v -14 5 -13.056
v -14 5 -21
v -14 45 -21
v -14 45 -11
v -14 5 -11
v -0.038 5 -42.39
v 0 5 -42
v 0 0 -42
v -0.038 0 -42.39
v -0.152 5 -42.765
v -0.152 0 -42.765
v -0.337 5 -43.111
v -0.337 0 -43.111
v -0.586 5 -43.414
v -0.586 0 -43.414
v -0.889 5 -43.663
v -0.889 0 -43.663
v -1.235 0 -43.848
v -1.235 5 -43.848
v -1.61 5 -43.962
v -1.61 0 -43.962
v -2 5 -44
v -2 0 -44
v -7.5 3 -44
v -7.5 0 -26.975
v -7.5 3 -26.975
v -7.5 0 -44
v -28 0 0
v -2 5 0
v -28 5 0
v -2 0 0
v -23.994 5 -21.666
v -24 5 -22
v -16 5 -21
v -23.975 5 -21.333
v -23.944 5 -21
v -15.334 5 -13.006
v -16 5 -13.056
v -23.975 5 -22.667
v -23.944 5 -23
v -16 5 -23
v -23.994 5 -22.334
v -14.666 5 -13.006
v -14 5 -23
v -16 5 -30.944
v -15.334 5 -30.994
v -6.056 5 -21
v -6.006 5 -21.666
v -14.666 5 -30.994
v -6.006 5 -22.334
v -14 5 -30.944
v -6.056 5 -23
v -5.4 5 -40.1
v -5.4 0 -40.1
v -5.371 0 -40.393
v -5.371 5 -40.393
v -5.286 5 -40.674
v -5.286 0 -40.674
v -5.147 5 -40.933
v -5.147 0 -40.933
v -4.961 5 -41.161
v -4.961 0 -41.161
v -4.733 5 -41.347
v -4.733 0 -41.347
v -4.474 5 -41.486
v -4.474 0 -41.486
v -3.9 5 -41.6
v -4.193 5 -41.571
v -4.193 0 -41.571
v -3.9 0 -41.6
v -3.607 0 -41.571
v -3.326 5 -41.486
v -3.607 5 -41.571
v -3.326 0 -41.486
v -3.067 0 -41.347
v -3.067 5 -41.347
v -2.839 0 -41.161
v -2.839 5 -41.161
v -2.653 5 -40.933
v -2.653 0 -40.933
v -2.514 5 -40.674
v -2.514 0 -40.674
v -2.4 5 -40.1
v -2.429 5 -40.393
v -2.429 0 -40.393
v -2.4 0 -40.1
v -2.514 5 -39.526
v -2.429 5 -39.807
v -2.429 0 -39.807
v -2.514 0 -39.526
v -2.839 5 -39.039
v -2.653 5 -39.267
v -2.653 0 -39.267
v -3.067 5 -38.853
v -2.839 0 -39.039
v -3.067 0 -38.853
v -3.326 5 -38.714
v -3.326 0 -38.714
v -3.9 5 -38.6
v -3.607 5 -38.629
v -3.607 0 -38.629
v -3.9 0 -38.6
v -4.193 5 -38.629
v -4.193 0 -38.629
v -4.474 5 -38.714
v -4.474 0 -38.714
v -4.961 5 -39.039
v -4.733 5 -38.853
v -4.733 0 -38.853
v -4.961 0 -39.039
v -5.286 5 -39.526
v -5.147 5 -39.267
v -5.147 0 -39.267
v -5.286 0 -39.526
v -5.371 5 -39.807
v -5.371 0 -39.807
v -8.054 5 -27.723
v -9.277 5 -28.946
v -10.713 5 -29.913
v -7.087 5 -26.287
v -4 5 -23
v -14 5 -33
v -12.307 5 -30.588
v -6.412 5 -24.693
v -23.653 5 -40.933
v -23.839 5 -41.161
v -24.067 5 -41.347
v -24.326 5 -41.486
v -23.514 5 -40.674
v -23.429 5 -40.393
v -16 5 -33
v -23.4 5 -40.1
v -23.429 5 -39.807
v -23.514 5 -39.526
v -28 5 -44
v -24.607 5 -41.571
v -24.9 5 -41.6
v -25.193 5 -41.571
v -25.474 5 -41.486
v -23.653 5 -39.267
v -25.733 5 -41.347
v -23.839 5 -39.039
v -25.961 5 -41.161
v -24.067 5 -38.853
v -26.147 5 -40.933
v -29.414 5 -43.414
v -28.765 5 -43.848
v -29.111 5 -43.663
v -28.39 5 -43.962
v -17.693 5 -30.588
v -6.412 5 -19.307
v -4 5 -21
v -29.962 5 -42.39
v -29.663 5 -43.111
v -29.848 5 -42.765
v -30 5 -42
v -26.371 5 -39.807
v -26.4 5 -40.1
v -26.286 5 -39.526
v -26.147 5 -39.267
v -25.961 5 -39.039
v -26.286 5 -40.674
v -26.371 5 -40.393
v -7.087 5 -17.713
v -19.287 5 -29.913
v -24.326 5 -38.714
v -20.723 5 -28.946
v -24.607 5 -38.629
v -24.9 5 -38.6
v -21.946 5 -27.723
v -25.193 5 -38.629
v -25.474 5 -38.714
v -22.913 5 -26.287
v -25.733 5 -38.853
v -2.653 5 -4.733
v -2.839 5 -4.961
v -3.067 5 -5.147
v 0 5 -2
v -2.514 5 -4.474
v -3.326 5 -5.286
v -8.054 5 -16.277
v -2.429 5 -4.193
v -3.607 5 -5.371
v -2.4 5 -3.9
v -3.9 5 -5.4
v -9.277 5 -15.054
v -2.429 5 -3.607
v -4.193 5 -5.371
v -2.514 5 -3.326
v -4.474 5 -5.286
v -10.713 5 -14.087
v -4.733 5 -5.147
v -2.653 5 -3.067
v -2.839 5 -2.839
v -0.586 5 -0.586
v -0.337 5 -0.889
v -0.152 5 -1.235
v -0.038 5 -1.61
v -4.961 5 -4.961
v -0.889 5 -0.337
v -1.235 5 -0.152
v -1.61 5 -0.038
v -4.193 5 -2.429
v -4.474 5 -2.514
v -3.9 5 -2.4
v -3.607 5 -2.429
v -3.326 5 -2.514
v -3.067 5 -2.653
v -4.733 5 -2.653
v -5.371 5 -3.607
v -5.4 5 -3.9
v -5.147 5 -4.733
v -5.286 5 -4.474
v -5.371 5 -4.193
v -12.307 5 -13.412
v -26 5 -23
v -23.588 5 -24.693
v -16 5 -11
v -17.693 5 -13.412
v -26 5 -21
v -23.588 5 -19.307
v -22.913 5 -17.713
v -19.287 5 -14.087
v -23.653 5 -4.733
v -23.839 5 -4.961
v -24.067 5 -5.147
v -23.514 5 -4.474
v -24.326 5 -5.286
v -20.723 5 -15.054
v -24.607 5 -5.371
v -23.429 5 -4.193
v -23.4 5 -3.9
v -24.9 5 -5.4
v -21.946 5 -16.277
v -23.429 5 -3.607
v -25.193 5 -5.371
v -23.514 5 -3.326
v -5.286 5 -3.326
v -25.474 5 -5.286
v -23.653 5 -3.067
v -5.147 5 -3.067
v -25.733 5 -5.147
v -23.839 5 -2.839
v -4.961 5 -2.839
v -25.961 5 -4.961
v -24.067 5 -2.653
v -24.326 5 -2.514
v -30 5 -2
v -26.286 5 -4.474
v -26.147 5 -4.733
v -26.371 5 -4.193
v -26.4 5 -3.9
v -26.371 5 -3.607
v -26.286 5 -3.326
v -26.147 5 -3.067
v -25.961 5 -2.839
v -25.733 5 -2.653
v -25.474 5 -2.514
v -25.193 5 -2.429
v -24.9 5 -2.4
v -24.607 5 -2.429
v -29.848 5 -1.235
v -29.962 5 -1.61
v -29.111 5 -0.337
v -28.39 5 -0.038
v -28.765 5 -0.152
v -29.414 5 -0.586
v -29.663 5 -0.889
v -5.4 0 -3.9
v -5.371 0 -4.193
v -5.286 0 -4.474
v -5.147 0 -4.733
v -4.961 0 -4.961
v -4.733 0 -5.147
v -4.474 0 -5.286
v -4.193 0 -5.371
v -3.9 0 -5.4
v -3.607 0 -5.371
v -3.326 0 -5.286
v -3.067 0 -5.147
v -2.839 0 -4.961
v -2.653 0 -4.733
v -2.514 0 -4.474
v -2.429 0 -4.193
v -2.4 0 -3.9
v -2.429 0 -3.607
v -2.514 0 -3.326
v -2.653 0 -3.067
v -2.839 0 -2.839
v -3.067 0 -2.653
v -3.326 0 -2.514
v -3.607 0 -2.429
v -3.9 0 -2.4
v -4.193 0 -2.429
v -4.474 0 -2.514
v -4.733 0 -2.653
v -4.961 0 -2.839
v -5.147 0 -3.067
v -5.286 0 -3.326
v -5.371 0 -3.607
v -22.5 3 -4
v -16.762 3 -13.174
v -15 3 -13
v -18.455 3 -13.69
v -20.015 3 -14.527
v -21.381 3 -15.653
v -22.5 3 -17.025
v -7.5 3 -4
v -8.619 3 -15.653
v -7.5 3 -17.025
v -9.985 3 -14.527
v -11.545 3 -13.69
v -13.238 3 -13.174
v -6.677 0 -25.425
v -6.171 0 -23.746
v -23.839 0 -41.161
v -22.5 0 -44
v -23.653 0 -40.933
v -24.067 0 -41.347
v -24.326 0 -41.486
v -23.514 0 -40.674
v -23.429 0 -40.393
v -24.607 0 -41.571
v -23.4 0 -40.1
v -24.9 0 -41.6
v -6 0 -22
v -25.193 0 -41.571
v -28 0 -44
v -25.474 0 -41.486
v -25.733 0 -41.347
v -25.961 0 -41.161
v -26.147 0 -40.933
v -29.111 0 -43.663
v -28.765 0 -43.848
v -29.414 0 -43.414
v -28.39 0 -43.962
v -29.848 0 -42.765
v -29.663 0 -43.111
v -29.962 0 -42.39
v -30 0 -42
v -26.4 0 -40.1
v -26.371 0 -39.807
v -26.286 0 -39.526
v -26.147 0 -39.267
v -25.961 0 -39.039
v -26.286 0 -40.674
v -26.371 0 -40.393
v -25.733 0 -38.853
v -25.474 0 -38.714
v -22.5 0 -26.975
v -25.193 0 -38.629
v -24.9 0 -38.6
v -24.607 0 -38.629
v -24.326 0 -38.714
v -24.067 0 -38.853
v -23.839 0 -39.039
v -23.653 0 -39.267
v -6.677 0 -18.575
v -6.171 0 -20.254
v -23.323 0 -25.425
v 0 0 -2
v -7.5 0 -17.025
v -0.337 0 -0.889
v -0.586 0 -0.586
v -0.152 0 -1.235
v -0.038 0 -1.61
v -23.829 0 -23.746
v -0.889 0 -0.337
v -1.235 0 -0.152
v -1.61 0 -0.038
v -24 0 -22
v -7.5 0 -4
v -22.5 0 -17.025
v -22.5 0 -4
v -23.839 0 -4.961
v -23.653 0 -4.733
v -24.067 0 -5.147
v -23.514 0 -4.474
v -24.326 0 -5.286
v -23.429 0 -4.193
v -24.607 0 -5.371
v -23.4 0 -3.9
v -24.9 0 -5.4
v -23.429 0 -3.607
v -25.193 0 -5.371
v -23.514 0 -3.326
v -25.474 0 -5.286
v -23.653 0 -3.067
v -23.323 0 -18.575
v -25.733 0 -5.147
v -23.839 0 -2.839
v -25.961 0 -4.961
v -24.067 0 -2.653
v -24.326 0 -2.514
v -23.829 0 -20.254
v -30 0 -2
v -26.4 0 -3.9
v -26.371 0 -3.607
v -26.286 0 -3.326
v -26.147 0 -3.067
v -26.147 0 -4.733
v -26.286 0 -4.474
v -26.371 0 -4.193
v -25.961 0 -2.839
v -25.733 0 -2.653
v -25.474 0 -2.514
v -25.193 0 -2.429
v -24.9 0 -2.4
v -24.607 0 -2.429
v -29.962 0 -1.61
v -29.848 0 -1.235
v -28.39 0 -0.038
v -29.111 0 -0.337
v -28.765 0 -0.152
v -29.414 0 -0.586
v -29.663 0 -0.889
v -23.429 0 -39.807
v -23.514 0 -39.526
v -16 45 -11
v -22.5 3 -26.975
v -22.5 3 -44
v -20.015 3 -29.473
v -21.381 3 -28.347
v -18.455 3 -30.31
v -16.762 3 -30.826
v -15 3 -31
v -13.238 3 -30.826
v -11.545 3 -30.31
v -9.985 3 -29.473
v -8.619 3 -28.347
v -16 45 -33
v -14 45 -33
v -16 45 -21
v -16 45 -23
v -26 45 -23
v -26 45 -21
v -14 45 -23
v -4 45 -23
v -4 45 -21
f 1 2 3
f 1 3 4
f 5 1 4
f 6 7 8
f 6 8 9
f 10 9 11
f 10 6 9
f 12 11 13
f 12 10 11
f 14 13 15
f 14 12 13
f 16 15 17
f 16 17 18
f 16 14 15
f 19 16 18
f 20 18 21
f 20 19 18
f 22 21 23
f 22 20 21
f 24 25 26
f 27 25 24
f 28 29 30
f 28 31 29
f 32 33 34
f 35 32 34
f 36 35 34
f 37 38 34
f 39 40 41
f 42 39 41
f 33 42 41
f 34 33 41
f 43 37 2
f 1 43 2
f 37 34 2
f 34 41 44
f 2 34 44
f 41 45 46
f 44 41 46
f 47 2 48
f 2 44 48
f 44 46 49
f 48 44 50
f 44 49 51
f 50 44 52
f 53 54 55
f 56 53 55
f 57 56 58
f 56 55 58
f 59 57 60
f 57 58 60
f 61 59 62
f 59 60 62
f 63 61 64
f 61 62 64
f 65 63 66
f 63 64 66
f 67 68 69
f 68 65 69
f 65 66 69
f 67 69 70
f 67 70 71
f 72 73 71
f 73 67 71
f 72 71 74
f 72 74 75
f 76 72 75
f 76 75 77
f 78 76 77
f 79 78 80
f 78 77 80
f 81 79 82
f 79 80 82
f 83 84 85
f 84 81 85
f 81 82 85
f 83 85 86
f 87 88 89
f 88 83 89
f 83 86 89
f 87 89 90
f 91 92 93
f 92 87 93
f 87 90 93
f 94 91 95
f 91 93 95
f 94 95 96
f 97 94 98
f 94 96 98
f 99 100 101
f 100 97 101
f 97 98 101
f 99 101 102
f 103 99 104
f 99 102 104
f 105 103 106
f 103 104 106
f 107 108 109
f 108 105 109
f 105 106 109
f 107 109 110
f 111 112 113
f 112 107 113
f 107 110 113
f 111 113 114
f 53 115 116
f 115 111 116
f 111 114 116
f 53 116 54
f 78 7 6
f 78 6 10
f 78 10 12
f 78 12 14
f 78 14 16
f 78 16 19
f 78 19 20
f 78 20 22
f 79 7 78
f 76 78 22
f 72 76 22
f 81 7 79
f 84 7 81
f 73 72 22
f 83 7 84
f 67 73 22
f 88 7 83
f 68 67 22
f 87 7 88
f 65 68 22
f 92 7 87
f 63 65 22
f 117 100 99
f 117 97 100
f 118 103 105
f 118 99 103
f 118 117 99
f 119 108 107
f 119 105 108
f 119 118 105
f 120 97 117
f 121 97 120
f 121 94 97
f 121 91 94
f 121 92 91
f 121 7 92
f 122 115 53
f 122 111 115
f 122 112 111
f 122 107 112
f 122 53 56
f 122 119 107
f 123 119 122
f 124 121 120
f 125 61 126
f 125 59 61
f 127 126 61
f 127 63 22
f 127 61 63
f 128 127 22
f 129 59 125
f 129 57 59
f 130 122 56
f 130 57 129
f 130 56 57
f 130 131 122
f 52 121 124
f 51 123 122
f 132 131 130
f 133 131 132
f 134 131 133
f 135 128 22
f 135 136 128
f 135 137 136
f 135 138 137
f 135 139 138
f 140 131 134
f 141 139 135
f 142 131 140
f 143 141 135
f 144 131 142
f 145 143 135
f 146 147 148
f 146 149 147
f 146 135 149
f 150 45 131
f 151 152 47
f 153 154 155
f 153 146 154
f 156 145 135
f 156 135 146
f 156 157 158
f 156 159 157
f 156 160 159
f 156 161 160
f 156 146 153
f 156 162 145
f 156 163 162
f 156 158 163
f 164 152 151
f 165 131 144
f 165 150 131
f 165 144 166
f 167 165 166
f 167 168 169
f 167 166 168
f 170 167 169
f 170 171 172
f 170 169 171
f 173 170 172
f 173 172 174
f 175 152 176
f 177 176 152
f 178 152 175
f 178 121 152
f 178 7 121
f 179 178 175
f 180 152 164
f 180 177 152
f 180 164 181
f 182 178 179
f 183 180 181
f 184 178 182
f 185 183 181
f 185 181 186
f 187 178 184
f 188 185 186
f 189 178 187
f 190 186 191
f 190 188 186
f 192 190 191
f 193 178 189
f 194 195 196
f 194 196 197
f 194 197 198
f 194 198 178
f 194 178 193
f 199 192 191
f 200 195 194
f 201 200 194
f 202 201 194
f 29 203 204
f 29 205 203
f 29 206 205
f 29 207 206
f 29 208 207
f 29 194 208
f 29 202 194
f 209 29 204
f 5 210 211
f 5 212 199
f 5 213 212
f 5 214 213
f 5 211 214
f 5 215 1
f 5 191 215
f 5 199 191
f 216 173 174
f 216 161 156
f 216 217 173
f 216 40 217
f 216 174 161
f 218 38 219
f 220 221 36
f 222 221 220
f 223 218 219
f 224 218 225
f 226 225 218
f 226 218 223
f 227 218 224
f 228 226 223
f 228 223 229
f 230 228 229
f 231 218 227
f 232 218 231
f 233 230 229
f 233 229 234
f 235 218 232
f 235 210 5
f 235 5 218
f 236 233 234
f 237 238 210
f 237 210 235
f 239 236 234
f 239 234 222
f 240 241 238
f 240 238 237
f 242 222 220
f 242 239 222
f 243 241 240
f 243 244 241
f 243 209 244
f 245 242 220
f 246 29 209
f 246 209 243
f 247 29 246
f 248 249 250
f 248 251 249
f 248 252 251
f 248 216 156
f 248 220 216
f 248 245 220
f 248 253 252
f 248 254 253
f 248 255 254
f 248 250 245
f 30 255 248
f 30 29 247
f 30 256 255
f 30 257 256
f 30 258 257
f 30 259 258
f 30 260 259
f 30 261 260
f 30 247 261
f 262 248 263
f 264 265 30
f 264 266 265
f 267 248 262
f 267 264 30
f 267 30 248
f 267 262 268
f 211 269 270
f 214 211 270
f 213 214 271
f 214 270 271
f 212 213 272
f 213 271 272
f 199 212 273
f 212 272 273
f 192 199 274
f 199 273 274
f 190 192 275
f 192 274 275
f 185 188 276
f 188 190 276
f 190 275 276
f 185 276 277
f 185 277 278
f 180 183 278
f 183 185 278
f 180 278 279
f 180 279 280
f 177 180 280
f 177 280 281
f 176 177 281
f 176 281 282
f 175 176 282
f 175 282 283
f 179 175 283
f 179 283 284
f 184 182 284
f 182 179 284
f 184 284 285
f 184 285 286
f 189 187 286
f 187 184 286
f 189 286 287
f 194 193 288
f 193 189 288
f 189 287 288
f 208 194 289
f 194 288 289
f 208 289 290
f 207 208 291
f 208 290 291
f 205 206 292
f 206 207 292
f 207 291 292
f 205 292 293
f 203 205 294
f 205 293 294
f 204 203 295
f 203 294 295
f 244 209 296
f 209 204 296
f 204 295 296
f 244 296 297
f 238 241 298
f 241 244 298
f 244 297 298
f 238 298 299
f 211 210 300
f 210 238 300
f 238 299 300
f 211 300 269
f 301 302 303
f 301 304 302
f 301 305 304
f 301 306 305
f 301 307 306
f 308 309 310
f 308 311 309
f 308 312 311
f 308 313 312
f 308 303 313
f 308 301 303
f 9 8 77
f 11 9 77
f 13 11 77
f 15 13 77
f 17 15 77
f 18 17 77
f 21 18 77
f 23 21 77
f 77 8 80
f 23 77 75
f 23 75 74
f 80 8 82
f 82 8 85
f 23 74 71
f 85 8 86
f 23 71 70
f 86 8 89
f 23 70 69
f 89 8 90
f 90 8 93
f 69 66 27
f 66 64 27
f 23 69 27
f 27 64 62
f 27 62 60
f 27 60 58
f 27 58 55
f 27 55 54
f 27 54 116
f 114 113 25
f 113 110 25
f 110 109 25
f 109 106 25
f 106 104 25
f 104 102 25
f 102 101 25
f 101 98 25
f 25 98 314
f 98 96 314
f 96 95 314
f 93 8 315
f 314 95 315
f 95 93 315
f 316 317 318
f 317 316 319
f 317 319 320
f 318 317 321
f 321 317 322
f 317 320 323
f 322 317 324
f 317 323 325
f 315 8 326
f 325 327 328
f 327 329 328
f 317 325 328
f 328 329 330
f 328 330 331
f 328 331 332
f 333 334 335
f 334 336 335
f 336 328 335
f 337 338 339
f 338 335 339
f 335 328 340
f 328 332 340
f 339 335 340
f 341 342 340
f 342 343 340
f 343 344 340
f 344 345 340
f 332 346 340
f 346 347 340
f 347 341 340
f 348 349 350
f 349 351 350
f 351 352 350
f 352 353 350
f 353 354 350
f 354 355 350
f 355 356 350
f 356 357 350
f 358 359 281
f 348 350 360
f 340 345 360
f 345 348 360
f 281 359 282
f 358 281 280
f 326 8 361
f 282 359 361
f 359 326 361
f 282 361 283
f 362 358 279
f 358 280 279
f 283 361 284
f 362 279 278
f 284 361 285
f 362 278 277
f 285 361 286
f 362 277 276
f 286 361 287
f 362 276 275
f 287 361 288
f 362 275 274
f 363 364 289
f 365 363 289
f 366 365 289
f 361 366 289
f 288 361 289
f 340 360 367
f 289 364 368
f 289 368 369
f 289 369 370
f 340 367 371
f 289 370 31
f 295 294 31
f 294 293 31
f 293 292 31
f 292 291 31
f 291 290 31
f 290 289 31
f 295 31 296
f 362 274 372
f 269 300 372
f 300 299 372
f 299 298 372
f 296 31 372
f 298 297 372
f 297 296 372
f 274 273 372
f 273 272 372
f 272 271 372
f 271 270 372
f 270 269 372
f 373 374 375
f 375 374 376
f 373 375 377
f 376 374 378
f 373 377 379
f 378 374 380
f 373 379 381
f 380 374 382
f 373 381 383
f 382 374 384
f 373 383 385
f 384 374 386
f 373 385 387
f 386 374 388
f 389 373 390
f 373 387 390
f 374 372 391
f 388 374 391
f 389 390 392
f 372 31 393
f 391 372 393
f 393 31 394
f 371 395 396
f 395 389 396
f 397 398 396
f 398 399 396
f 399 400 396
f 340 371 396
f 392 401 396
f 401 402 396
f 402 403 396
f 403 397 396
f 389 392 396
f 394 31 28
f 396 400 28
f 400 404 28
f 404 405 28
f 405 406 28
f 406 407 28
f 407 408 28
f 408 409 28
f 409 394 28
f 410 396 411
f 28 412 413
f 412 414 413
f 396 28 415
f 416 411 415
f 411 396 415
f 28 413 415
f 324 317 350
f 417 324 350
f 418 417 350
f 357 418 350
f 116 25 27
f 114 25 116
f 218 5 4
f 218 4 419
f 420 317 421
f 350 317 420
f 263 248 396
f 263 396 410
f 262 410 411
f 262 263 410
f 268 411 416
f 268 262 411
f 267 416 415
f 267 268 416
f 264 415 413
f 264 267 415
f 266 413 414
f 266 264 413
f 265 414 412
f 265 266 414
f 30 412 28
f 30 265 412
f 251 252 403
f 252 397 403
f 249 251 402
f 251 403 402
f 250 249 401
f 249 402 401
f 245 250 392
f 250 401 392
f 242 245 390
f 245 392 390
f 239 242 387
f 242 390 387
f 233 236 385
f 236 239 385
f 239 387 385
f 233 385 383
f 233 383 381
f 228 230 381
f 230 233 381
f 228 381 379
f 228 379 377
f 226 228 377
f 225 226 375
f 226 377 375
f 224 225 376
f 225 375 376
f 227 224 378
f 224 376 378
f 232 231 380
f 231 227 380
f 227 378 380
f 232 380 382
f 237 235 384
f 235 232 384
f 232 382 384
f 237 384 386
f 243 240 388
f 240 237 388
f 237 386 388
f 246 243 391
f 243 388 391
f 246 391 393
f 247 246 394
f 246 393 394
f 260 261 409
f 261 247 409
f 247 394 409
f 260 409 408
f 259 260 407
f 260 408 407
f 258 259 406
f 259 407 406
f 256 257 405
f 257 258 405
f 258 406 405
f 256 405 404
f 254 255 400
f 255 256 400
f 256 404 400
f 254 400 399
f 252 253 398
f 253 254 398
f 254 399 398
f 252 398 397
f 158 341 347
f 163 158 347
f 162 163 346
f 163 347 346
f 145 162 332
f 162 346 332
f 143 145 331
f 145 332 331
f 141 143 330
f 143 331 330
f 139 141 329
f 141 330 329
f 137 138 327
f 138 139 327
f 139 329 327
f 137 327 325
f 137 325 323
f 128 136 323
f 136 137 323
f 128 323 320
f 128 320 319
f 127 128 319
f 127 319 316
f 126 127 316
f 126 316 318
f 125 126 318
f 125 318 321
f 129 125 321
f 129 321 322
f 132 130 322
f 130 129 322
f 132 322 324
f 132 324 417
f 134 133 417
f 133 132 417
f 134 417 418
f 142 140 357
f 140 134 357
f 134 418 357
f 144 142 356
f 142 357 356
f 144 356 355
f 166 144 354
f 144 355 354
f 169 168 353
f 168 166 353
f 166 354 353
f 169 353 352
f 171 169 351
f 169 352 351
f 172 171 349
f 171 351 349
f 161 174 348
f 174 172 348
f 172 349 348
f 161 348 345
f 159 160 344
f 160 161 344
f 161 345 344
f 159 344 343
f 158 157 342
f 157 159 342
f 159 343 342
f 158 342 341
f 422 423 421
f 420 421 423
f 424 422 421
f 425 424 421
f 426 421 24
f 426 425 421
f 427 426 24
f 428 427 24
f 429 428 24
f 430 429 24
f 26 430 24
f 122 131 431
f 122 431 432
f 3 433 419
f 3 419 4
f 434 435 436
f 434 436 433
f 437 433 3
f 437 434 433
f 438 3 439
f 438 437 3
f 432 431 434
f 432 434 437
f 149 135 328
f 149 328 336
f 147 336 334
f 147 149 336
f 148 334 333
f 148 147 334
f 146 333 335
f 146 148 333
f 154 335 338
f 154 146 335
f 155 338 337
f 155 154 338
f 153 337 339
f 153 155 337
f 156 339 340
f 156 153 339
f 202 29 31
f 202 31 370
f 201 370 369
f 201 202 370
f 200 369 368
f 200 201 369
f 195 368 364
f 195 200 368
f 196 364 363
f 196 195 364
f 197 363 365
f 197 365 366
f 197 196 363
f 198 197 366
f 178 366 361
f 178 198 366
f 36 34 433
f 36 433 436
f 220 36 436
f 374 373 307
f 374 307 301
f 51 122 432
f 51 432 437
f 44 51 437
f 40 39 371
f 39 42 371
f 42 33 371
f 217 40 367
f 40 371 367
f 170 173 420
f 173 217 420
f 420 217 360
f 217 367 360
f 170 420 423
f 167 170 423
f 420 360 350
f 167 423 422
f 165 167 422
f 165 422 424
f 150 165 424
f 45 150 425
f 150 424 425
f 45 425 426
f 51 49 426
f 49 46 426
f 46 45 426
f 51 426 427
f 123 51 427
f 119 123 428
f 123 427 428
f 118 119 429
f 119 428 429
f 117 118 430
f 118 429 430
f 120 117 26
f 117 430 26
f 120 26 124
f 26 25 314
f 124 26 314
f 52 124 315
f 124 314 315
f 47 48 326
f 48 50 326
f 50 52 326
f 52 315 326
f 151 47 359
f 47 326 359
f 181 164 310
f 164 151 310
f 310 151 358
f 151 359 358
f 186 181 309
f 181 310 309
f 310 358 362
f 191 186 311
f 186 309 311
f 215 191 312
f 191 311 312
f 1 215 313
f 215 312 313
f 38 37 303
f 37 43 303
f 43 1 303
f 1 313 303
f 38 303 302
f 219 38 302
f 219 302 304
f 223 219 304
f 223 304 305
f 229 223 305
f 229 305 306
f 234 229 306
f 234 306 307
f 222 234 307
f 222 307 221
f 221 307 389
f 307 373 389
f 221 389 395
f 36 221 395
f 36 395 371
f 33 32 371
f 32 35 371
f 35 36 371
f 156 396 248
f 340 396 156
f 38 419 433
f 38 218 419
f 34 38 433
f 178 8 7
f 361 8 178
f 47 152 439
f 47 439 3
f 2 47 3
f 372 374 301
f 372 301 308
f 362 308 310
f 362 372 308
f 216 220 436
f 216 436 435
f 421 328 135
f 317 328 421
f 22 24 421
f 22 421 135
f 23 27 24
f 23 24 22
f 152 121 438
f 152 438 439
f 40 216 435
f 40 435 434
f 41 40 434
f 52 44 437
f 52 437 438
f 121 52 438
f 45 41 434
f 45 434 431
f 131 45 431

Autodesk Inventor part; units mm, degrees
ref_plane "YZ Plane" through (0, 0, 0) normal (1, 0, 0) x (0, 1, 0)
ref_plane "XZ Plane" through (0, 0, 0) normal (0, 1, 0) x (-1, 0, 0)
ref_plane "XY Plane" through (0, 0, 0) normal (0, 0, 1) x (1, 0, 0)
sketch "Sketch1" plane through (0, 0, 0) normal (0, 1, 0) x (-1, 0, 0)
  line L0 (0, 0) -> (30, 0)
  line L1 (30, 0) -> (30, -44)
  line L2 (30, -44) -> (0, -44)
  line L3 (0, -44) -> (0, 0)
  circle A0 centre (24.9, -3.9) radius 1.5
  circle A1 centre (3.9, -3.9) radius 1.5
  circle A2 centre (3.9, -40.1) radius 1.5
  circle A3 centre (24.9, -40.1) radius 1.5
  circle A4 centre (15, -22) radius 9
  dimension "d0" = 44
  dimension "d1" = 30
  dimension "d2" = 3
  dimension "d3" = 3
  dimension "d4" = 3
  dimension "d5" = 3
  dimension "d8" = 3.9
  dimension "d9" = 3.9
  dimension "d10" = 3.9
  dimension "d11" = 3.9
  dimension "d12" = 3.9
  dimension "d14" = 21
  dimension "d15" = 3.9
  dimension "d17" = 21
  dimension "d18" = 18
  dimension "d19" = 22
  dimension "d20" = 15
extrude "Extrusion1" add sketch "Sketch1" along normal blind 5
sketch "Sketch2" plane through (0, 0, 0) normal (0, -1, 0) x (1, 0, 0)
  line L0 (-7.5, -44) -> (-22.5, -44)
  line L1 (-22.5, -44) -> (-22.5, -4)
  line L2 (-22.5, -4) -> (-7.5, -4)
  line L3 (-7.5, -4) -> (-7.5, -44)
  line L4 (0, 0) -> (-30, 0) projected
  line L5 (-30, -44) -> (0, -44) projected
  line L6 (0, -44) -> (0, 0) projected
  line L7 (-30, 0) -> (-30, -44) projected
  dimension "d24" = 4
  dimension "d25" = 0
  dimension "d26" = 15
  dimension "d27" = 7.5
  dimension "d28" = 7.5
extrude "Extrusion2" cut sketch "Sketch2" against normal blind 3 contours L0 L1 L2 L3
fillet "Fillet1" radius 2 4 edges at (0, 2.5, 0) (-30, 2.5, 0) (-30, 2.5, -44) (0, 2.5, -44)
sketch "Sketch3" plane through (0, 5, 0) normal (0, 1, 0) x (1, 0, 0)
  line L0 (-26, 23) -> (-4, 23)
  line L1 (-4, 23) -> (-4, 21)
  line L2 (-4, 21) -> (-26, 21)
  line L3 (-26, 21) -> (-26, 23)
  line L4 (-2, 44) -> (-28, 44) projected
  circle A0 centre (-15, 22) radius 9 projected
  line L5 (-16, 33) -> (-14, 33)
  line L6 (-14, 33) -> (-14, 11)
  line L7 (-14, 11) -> (-16, 11)
  line L8 (-16, 11) -> (-16, 33)
  line L9 (-30, 42) -> (-30, 2) projected
  point P0 (0, 0)
  dimension "d32" = 2
  dimension "d33" = 21
  dimension "d34" = 11
  dimension "d35" = 11
  dimension "d36" = 14
  dimension "d37" = 2
  dimension "d38" = 11
  dimension "d39" = 11
extrude "Extrusion3" add sketch "Sketch3" along normal blind 40 contours L0 A0 L2 L3 | L0 L8 L2 A0 | L8 A0 L6 L0 | L0 L6 L2 L8 | L8 L5 L6 A0 | L0 A0 L2 L6 | L2 L6 A0 L8 | A0 L6 L7 L8 | L0 L1 L2 A0
sketch "Sketch4" plane through (-14, 5, -13.0557) normal (1, 0, 0) x (0, 0, -1)
  point P0 (-13.0557, -5)
properties part number "drzakfotorezistoru"
